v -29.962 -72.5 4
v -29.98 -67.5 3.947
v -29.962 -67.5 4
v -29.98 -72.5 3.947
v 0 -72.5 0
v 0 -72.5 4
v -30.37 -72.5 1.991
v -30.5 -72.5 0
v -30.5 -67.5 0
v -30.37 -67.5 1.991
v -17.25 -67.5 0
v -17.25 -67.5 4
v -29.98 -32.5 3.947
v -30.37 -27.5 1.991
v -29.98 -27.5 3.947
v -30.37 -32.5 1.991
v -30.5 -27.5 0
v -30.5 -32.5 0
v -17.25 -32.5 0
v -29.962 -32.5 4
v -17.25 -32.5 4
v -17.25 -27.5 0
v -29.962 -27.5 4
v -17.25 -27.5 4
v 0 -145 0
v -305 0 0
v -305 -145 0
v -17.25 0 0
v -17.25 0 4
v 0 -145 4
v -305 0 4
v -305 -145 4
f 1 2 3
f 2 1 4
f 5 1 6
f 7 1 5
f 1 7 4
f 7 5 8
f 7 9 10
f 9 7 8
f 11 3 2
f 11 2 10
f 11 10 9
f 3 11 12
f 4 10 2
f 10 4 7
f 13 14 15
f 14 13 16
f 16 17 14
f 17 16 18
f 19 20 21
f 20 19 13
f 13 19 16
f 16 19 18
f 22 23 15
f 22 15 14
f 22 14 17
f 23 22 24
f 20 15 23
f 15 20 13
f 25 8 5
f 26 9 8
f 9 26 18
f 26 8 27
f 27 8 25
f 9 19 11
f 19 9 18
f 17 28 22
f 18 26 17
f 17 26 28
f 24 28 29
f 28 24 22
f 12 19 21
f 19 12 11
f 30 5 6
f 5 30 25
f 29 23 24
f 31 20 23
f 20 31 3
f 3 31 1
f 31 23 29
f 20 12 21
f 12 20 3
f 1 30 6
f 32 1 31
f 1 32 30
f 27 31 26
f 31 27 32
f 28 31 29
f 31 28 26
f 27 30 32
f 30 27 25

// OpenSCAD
// Tube rack - a flat plate with a regular grid of tube holes and two solid walls along the
// long edges. Printed upside down and flipped over, it stands on the two walls with the
// tubes passing through the holes. NOVEL general part.
//

cols   = 6;
rows   = 2;
tube_d = 30.5;
pitch_x = 40;
pitch_y = 40;
plate_h = 4;
wall_h = 70;

$fn = 48;

edge = tube_d + 4;

difference() {
    translate([-X, -Y, 0]) cube([X, Y, plate_h]);
    for (i = [0 : cols - 1], j = [0 : rows - 1])
        translate([-(tube_d / 2), j * pitch_y - Y / 2, 0]) rotate([-90, 0, 0]) cylinder(h = plate_h + 1, d = tube_d);
    for (i = [0 : cols - 1])
        translate([-(edge / 2), -Y / 2, 0]) cube([edge, Y, wall_h]);
}

X = cols * pitch_x + 2 * (tube_d / 2 + edge / 2);
Y = rows * pitch_y + 2 * (tube_d / 2 + edge / 2);
